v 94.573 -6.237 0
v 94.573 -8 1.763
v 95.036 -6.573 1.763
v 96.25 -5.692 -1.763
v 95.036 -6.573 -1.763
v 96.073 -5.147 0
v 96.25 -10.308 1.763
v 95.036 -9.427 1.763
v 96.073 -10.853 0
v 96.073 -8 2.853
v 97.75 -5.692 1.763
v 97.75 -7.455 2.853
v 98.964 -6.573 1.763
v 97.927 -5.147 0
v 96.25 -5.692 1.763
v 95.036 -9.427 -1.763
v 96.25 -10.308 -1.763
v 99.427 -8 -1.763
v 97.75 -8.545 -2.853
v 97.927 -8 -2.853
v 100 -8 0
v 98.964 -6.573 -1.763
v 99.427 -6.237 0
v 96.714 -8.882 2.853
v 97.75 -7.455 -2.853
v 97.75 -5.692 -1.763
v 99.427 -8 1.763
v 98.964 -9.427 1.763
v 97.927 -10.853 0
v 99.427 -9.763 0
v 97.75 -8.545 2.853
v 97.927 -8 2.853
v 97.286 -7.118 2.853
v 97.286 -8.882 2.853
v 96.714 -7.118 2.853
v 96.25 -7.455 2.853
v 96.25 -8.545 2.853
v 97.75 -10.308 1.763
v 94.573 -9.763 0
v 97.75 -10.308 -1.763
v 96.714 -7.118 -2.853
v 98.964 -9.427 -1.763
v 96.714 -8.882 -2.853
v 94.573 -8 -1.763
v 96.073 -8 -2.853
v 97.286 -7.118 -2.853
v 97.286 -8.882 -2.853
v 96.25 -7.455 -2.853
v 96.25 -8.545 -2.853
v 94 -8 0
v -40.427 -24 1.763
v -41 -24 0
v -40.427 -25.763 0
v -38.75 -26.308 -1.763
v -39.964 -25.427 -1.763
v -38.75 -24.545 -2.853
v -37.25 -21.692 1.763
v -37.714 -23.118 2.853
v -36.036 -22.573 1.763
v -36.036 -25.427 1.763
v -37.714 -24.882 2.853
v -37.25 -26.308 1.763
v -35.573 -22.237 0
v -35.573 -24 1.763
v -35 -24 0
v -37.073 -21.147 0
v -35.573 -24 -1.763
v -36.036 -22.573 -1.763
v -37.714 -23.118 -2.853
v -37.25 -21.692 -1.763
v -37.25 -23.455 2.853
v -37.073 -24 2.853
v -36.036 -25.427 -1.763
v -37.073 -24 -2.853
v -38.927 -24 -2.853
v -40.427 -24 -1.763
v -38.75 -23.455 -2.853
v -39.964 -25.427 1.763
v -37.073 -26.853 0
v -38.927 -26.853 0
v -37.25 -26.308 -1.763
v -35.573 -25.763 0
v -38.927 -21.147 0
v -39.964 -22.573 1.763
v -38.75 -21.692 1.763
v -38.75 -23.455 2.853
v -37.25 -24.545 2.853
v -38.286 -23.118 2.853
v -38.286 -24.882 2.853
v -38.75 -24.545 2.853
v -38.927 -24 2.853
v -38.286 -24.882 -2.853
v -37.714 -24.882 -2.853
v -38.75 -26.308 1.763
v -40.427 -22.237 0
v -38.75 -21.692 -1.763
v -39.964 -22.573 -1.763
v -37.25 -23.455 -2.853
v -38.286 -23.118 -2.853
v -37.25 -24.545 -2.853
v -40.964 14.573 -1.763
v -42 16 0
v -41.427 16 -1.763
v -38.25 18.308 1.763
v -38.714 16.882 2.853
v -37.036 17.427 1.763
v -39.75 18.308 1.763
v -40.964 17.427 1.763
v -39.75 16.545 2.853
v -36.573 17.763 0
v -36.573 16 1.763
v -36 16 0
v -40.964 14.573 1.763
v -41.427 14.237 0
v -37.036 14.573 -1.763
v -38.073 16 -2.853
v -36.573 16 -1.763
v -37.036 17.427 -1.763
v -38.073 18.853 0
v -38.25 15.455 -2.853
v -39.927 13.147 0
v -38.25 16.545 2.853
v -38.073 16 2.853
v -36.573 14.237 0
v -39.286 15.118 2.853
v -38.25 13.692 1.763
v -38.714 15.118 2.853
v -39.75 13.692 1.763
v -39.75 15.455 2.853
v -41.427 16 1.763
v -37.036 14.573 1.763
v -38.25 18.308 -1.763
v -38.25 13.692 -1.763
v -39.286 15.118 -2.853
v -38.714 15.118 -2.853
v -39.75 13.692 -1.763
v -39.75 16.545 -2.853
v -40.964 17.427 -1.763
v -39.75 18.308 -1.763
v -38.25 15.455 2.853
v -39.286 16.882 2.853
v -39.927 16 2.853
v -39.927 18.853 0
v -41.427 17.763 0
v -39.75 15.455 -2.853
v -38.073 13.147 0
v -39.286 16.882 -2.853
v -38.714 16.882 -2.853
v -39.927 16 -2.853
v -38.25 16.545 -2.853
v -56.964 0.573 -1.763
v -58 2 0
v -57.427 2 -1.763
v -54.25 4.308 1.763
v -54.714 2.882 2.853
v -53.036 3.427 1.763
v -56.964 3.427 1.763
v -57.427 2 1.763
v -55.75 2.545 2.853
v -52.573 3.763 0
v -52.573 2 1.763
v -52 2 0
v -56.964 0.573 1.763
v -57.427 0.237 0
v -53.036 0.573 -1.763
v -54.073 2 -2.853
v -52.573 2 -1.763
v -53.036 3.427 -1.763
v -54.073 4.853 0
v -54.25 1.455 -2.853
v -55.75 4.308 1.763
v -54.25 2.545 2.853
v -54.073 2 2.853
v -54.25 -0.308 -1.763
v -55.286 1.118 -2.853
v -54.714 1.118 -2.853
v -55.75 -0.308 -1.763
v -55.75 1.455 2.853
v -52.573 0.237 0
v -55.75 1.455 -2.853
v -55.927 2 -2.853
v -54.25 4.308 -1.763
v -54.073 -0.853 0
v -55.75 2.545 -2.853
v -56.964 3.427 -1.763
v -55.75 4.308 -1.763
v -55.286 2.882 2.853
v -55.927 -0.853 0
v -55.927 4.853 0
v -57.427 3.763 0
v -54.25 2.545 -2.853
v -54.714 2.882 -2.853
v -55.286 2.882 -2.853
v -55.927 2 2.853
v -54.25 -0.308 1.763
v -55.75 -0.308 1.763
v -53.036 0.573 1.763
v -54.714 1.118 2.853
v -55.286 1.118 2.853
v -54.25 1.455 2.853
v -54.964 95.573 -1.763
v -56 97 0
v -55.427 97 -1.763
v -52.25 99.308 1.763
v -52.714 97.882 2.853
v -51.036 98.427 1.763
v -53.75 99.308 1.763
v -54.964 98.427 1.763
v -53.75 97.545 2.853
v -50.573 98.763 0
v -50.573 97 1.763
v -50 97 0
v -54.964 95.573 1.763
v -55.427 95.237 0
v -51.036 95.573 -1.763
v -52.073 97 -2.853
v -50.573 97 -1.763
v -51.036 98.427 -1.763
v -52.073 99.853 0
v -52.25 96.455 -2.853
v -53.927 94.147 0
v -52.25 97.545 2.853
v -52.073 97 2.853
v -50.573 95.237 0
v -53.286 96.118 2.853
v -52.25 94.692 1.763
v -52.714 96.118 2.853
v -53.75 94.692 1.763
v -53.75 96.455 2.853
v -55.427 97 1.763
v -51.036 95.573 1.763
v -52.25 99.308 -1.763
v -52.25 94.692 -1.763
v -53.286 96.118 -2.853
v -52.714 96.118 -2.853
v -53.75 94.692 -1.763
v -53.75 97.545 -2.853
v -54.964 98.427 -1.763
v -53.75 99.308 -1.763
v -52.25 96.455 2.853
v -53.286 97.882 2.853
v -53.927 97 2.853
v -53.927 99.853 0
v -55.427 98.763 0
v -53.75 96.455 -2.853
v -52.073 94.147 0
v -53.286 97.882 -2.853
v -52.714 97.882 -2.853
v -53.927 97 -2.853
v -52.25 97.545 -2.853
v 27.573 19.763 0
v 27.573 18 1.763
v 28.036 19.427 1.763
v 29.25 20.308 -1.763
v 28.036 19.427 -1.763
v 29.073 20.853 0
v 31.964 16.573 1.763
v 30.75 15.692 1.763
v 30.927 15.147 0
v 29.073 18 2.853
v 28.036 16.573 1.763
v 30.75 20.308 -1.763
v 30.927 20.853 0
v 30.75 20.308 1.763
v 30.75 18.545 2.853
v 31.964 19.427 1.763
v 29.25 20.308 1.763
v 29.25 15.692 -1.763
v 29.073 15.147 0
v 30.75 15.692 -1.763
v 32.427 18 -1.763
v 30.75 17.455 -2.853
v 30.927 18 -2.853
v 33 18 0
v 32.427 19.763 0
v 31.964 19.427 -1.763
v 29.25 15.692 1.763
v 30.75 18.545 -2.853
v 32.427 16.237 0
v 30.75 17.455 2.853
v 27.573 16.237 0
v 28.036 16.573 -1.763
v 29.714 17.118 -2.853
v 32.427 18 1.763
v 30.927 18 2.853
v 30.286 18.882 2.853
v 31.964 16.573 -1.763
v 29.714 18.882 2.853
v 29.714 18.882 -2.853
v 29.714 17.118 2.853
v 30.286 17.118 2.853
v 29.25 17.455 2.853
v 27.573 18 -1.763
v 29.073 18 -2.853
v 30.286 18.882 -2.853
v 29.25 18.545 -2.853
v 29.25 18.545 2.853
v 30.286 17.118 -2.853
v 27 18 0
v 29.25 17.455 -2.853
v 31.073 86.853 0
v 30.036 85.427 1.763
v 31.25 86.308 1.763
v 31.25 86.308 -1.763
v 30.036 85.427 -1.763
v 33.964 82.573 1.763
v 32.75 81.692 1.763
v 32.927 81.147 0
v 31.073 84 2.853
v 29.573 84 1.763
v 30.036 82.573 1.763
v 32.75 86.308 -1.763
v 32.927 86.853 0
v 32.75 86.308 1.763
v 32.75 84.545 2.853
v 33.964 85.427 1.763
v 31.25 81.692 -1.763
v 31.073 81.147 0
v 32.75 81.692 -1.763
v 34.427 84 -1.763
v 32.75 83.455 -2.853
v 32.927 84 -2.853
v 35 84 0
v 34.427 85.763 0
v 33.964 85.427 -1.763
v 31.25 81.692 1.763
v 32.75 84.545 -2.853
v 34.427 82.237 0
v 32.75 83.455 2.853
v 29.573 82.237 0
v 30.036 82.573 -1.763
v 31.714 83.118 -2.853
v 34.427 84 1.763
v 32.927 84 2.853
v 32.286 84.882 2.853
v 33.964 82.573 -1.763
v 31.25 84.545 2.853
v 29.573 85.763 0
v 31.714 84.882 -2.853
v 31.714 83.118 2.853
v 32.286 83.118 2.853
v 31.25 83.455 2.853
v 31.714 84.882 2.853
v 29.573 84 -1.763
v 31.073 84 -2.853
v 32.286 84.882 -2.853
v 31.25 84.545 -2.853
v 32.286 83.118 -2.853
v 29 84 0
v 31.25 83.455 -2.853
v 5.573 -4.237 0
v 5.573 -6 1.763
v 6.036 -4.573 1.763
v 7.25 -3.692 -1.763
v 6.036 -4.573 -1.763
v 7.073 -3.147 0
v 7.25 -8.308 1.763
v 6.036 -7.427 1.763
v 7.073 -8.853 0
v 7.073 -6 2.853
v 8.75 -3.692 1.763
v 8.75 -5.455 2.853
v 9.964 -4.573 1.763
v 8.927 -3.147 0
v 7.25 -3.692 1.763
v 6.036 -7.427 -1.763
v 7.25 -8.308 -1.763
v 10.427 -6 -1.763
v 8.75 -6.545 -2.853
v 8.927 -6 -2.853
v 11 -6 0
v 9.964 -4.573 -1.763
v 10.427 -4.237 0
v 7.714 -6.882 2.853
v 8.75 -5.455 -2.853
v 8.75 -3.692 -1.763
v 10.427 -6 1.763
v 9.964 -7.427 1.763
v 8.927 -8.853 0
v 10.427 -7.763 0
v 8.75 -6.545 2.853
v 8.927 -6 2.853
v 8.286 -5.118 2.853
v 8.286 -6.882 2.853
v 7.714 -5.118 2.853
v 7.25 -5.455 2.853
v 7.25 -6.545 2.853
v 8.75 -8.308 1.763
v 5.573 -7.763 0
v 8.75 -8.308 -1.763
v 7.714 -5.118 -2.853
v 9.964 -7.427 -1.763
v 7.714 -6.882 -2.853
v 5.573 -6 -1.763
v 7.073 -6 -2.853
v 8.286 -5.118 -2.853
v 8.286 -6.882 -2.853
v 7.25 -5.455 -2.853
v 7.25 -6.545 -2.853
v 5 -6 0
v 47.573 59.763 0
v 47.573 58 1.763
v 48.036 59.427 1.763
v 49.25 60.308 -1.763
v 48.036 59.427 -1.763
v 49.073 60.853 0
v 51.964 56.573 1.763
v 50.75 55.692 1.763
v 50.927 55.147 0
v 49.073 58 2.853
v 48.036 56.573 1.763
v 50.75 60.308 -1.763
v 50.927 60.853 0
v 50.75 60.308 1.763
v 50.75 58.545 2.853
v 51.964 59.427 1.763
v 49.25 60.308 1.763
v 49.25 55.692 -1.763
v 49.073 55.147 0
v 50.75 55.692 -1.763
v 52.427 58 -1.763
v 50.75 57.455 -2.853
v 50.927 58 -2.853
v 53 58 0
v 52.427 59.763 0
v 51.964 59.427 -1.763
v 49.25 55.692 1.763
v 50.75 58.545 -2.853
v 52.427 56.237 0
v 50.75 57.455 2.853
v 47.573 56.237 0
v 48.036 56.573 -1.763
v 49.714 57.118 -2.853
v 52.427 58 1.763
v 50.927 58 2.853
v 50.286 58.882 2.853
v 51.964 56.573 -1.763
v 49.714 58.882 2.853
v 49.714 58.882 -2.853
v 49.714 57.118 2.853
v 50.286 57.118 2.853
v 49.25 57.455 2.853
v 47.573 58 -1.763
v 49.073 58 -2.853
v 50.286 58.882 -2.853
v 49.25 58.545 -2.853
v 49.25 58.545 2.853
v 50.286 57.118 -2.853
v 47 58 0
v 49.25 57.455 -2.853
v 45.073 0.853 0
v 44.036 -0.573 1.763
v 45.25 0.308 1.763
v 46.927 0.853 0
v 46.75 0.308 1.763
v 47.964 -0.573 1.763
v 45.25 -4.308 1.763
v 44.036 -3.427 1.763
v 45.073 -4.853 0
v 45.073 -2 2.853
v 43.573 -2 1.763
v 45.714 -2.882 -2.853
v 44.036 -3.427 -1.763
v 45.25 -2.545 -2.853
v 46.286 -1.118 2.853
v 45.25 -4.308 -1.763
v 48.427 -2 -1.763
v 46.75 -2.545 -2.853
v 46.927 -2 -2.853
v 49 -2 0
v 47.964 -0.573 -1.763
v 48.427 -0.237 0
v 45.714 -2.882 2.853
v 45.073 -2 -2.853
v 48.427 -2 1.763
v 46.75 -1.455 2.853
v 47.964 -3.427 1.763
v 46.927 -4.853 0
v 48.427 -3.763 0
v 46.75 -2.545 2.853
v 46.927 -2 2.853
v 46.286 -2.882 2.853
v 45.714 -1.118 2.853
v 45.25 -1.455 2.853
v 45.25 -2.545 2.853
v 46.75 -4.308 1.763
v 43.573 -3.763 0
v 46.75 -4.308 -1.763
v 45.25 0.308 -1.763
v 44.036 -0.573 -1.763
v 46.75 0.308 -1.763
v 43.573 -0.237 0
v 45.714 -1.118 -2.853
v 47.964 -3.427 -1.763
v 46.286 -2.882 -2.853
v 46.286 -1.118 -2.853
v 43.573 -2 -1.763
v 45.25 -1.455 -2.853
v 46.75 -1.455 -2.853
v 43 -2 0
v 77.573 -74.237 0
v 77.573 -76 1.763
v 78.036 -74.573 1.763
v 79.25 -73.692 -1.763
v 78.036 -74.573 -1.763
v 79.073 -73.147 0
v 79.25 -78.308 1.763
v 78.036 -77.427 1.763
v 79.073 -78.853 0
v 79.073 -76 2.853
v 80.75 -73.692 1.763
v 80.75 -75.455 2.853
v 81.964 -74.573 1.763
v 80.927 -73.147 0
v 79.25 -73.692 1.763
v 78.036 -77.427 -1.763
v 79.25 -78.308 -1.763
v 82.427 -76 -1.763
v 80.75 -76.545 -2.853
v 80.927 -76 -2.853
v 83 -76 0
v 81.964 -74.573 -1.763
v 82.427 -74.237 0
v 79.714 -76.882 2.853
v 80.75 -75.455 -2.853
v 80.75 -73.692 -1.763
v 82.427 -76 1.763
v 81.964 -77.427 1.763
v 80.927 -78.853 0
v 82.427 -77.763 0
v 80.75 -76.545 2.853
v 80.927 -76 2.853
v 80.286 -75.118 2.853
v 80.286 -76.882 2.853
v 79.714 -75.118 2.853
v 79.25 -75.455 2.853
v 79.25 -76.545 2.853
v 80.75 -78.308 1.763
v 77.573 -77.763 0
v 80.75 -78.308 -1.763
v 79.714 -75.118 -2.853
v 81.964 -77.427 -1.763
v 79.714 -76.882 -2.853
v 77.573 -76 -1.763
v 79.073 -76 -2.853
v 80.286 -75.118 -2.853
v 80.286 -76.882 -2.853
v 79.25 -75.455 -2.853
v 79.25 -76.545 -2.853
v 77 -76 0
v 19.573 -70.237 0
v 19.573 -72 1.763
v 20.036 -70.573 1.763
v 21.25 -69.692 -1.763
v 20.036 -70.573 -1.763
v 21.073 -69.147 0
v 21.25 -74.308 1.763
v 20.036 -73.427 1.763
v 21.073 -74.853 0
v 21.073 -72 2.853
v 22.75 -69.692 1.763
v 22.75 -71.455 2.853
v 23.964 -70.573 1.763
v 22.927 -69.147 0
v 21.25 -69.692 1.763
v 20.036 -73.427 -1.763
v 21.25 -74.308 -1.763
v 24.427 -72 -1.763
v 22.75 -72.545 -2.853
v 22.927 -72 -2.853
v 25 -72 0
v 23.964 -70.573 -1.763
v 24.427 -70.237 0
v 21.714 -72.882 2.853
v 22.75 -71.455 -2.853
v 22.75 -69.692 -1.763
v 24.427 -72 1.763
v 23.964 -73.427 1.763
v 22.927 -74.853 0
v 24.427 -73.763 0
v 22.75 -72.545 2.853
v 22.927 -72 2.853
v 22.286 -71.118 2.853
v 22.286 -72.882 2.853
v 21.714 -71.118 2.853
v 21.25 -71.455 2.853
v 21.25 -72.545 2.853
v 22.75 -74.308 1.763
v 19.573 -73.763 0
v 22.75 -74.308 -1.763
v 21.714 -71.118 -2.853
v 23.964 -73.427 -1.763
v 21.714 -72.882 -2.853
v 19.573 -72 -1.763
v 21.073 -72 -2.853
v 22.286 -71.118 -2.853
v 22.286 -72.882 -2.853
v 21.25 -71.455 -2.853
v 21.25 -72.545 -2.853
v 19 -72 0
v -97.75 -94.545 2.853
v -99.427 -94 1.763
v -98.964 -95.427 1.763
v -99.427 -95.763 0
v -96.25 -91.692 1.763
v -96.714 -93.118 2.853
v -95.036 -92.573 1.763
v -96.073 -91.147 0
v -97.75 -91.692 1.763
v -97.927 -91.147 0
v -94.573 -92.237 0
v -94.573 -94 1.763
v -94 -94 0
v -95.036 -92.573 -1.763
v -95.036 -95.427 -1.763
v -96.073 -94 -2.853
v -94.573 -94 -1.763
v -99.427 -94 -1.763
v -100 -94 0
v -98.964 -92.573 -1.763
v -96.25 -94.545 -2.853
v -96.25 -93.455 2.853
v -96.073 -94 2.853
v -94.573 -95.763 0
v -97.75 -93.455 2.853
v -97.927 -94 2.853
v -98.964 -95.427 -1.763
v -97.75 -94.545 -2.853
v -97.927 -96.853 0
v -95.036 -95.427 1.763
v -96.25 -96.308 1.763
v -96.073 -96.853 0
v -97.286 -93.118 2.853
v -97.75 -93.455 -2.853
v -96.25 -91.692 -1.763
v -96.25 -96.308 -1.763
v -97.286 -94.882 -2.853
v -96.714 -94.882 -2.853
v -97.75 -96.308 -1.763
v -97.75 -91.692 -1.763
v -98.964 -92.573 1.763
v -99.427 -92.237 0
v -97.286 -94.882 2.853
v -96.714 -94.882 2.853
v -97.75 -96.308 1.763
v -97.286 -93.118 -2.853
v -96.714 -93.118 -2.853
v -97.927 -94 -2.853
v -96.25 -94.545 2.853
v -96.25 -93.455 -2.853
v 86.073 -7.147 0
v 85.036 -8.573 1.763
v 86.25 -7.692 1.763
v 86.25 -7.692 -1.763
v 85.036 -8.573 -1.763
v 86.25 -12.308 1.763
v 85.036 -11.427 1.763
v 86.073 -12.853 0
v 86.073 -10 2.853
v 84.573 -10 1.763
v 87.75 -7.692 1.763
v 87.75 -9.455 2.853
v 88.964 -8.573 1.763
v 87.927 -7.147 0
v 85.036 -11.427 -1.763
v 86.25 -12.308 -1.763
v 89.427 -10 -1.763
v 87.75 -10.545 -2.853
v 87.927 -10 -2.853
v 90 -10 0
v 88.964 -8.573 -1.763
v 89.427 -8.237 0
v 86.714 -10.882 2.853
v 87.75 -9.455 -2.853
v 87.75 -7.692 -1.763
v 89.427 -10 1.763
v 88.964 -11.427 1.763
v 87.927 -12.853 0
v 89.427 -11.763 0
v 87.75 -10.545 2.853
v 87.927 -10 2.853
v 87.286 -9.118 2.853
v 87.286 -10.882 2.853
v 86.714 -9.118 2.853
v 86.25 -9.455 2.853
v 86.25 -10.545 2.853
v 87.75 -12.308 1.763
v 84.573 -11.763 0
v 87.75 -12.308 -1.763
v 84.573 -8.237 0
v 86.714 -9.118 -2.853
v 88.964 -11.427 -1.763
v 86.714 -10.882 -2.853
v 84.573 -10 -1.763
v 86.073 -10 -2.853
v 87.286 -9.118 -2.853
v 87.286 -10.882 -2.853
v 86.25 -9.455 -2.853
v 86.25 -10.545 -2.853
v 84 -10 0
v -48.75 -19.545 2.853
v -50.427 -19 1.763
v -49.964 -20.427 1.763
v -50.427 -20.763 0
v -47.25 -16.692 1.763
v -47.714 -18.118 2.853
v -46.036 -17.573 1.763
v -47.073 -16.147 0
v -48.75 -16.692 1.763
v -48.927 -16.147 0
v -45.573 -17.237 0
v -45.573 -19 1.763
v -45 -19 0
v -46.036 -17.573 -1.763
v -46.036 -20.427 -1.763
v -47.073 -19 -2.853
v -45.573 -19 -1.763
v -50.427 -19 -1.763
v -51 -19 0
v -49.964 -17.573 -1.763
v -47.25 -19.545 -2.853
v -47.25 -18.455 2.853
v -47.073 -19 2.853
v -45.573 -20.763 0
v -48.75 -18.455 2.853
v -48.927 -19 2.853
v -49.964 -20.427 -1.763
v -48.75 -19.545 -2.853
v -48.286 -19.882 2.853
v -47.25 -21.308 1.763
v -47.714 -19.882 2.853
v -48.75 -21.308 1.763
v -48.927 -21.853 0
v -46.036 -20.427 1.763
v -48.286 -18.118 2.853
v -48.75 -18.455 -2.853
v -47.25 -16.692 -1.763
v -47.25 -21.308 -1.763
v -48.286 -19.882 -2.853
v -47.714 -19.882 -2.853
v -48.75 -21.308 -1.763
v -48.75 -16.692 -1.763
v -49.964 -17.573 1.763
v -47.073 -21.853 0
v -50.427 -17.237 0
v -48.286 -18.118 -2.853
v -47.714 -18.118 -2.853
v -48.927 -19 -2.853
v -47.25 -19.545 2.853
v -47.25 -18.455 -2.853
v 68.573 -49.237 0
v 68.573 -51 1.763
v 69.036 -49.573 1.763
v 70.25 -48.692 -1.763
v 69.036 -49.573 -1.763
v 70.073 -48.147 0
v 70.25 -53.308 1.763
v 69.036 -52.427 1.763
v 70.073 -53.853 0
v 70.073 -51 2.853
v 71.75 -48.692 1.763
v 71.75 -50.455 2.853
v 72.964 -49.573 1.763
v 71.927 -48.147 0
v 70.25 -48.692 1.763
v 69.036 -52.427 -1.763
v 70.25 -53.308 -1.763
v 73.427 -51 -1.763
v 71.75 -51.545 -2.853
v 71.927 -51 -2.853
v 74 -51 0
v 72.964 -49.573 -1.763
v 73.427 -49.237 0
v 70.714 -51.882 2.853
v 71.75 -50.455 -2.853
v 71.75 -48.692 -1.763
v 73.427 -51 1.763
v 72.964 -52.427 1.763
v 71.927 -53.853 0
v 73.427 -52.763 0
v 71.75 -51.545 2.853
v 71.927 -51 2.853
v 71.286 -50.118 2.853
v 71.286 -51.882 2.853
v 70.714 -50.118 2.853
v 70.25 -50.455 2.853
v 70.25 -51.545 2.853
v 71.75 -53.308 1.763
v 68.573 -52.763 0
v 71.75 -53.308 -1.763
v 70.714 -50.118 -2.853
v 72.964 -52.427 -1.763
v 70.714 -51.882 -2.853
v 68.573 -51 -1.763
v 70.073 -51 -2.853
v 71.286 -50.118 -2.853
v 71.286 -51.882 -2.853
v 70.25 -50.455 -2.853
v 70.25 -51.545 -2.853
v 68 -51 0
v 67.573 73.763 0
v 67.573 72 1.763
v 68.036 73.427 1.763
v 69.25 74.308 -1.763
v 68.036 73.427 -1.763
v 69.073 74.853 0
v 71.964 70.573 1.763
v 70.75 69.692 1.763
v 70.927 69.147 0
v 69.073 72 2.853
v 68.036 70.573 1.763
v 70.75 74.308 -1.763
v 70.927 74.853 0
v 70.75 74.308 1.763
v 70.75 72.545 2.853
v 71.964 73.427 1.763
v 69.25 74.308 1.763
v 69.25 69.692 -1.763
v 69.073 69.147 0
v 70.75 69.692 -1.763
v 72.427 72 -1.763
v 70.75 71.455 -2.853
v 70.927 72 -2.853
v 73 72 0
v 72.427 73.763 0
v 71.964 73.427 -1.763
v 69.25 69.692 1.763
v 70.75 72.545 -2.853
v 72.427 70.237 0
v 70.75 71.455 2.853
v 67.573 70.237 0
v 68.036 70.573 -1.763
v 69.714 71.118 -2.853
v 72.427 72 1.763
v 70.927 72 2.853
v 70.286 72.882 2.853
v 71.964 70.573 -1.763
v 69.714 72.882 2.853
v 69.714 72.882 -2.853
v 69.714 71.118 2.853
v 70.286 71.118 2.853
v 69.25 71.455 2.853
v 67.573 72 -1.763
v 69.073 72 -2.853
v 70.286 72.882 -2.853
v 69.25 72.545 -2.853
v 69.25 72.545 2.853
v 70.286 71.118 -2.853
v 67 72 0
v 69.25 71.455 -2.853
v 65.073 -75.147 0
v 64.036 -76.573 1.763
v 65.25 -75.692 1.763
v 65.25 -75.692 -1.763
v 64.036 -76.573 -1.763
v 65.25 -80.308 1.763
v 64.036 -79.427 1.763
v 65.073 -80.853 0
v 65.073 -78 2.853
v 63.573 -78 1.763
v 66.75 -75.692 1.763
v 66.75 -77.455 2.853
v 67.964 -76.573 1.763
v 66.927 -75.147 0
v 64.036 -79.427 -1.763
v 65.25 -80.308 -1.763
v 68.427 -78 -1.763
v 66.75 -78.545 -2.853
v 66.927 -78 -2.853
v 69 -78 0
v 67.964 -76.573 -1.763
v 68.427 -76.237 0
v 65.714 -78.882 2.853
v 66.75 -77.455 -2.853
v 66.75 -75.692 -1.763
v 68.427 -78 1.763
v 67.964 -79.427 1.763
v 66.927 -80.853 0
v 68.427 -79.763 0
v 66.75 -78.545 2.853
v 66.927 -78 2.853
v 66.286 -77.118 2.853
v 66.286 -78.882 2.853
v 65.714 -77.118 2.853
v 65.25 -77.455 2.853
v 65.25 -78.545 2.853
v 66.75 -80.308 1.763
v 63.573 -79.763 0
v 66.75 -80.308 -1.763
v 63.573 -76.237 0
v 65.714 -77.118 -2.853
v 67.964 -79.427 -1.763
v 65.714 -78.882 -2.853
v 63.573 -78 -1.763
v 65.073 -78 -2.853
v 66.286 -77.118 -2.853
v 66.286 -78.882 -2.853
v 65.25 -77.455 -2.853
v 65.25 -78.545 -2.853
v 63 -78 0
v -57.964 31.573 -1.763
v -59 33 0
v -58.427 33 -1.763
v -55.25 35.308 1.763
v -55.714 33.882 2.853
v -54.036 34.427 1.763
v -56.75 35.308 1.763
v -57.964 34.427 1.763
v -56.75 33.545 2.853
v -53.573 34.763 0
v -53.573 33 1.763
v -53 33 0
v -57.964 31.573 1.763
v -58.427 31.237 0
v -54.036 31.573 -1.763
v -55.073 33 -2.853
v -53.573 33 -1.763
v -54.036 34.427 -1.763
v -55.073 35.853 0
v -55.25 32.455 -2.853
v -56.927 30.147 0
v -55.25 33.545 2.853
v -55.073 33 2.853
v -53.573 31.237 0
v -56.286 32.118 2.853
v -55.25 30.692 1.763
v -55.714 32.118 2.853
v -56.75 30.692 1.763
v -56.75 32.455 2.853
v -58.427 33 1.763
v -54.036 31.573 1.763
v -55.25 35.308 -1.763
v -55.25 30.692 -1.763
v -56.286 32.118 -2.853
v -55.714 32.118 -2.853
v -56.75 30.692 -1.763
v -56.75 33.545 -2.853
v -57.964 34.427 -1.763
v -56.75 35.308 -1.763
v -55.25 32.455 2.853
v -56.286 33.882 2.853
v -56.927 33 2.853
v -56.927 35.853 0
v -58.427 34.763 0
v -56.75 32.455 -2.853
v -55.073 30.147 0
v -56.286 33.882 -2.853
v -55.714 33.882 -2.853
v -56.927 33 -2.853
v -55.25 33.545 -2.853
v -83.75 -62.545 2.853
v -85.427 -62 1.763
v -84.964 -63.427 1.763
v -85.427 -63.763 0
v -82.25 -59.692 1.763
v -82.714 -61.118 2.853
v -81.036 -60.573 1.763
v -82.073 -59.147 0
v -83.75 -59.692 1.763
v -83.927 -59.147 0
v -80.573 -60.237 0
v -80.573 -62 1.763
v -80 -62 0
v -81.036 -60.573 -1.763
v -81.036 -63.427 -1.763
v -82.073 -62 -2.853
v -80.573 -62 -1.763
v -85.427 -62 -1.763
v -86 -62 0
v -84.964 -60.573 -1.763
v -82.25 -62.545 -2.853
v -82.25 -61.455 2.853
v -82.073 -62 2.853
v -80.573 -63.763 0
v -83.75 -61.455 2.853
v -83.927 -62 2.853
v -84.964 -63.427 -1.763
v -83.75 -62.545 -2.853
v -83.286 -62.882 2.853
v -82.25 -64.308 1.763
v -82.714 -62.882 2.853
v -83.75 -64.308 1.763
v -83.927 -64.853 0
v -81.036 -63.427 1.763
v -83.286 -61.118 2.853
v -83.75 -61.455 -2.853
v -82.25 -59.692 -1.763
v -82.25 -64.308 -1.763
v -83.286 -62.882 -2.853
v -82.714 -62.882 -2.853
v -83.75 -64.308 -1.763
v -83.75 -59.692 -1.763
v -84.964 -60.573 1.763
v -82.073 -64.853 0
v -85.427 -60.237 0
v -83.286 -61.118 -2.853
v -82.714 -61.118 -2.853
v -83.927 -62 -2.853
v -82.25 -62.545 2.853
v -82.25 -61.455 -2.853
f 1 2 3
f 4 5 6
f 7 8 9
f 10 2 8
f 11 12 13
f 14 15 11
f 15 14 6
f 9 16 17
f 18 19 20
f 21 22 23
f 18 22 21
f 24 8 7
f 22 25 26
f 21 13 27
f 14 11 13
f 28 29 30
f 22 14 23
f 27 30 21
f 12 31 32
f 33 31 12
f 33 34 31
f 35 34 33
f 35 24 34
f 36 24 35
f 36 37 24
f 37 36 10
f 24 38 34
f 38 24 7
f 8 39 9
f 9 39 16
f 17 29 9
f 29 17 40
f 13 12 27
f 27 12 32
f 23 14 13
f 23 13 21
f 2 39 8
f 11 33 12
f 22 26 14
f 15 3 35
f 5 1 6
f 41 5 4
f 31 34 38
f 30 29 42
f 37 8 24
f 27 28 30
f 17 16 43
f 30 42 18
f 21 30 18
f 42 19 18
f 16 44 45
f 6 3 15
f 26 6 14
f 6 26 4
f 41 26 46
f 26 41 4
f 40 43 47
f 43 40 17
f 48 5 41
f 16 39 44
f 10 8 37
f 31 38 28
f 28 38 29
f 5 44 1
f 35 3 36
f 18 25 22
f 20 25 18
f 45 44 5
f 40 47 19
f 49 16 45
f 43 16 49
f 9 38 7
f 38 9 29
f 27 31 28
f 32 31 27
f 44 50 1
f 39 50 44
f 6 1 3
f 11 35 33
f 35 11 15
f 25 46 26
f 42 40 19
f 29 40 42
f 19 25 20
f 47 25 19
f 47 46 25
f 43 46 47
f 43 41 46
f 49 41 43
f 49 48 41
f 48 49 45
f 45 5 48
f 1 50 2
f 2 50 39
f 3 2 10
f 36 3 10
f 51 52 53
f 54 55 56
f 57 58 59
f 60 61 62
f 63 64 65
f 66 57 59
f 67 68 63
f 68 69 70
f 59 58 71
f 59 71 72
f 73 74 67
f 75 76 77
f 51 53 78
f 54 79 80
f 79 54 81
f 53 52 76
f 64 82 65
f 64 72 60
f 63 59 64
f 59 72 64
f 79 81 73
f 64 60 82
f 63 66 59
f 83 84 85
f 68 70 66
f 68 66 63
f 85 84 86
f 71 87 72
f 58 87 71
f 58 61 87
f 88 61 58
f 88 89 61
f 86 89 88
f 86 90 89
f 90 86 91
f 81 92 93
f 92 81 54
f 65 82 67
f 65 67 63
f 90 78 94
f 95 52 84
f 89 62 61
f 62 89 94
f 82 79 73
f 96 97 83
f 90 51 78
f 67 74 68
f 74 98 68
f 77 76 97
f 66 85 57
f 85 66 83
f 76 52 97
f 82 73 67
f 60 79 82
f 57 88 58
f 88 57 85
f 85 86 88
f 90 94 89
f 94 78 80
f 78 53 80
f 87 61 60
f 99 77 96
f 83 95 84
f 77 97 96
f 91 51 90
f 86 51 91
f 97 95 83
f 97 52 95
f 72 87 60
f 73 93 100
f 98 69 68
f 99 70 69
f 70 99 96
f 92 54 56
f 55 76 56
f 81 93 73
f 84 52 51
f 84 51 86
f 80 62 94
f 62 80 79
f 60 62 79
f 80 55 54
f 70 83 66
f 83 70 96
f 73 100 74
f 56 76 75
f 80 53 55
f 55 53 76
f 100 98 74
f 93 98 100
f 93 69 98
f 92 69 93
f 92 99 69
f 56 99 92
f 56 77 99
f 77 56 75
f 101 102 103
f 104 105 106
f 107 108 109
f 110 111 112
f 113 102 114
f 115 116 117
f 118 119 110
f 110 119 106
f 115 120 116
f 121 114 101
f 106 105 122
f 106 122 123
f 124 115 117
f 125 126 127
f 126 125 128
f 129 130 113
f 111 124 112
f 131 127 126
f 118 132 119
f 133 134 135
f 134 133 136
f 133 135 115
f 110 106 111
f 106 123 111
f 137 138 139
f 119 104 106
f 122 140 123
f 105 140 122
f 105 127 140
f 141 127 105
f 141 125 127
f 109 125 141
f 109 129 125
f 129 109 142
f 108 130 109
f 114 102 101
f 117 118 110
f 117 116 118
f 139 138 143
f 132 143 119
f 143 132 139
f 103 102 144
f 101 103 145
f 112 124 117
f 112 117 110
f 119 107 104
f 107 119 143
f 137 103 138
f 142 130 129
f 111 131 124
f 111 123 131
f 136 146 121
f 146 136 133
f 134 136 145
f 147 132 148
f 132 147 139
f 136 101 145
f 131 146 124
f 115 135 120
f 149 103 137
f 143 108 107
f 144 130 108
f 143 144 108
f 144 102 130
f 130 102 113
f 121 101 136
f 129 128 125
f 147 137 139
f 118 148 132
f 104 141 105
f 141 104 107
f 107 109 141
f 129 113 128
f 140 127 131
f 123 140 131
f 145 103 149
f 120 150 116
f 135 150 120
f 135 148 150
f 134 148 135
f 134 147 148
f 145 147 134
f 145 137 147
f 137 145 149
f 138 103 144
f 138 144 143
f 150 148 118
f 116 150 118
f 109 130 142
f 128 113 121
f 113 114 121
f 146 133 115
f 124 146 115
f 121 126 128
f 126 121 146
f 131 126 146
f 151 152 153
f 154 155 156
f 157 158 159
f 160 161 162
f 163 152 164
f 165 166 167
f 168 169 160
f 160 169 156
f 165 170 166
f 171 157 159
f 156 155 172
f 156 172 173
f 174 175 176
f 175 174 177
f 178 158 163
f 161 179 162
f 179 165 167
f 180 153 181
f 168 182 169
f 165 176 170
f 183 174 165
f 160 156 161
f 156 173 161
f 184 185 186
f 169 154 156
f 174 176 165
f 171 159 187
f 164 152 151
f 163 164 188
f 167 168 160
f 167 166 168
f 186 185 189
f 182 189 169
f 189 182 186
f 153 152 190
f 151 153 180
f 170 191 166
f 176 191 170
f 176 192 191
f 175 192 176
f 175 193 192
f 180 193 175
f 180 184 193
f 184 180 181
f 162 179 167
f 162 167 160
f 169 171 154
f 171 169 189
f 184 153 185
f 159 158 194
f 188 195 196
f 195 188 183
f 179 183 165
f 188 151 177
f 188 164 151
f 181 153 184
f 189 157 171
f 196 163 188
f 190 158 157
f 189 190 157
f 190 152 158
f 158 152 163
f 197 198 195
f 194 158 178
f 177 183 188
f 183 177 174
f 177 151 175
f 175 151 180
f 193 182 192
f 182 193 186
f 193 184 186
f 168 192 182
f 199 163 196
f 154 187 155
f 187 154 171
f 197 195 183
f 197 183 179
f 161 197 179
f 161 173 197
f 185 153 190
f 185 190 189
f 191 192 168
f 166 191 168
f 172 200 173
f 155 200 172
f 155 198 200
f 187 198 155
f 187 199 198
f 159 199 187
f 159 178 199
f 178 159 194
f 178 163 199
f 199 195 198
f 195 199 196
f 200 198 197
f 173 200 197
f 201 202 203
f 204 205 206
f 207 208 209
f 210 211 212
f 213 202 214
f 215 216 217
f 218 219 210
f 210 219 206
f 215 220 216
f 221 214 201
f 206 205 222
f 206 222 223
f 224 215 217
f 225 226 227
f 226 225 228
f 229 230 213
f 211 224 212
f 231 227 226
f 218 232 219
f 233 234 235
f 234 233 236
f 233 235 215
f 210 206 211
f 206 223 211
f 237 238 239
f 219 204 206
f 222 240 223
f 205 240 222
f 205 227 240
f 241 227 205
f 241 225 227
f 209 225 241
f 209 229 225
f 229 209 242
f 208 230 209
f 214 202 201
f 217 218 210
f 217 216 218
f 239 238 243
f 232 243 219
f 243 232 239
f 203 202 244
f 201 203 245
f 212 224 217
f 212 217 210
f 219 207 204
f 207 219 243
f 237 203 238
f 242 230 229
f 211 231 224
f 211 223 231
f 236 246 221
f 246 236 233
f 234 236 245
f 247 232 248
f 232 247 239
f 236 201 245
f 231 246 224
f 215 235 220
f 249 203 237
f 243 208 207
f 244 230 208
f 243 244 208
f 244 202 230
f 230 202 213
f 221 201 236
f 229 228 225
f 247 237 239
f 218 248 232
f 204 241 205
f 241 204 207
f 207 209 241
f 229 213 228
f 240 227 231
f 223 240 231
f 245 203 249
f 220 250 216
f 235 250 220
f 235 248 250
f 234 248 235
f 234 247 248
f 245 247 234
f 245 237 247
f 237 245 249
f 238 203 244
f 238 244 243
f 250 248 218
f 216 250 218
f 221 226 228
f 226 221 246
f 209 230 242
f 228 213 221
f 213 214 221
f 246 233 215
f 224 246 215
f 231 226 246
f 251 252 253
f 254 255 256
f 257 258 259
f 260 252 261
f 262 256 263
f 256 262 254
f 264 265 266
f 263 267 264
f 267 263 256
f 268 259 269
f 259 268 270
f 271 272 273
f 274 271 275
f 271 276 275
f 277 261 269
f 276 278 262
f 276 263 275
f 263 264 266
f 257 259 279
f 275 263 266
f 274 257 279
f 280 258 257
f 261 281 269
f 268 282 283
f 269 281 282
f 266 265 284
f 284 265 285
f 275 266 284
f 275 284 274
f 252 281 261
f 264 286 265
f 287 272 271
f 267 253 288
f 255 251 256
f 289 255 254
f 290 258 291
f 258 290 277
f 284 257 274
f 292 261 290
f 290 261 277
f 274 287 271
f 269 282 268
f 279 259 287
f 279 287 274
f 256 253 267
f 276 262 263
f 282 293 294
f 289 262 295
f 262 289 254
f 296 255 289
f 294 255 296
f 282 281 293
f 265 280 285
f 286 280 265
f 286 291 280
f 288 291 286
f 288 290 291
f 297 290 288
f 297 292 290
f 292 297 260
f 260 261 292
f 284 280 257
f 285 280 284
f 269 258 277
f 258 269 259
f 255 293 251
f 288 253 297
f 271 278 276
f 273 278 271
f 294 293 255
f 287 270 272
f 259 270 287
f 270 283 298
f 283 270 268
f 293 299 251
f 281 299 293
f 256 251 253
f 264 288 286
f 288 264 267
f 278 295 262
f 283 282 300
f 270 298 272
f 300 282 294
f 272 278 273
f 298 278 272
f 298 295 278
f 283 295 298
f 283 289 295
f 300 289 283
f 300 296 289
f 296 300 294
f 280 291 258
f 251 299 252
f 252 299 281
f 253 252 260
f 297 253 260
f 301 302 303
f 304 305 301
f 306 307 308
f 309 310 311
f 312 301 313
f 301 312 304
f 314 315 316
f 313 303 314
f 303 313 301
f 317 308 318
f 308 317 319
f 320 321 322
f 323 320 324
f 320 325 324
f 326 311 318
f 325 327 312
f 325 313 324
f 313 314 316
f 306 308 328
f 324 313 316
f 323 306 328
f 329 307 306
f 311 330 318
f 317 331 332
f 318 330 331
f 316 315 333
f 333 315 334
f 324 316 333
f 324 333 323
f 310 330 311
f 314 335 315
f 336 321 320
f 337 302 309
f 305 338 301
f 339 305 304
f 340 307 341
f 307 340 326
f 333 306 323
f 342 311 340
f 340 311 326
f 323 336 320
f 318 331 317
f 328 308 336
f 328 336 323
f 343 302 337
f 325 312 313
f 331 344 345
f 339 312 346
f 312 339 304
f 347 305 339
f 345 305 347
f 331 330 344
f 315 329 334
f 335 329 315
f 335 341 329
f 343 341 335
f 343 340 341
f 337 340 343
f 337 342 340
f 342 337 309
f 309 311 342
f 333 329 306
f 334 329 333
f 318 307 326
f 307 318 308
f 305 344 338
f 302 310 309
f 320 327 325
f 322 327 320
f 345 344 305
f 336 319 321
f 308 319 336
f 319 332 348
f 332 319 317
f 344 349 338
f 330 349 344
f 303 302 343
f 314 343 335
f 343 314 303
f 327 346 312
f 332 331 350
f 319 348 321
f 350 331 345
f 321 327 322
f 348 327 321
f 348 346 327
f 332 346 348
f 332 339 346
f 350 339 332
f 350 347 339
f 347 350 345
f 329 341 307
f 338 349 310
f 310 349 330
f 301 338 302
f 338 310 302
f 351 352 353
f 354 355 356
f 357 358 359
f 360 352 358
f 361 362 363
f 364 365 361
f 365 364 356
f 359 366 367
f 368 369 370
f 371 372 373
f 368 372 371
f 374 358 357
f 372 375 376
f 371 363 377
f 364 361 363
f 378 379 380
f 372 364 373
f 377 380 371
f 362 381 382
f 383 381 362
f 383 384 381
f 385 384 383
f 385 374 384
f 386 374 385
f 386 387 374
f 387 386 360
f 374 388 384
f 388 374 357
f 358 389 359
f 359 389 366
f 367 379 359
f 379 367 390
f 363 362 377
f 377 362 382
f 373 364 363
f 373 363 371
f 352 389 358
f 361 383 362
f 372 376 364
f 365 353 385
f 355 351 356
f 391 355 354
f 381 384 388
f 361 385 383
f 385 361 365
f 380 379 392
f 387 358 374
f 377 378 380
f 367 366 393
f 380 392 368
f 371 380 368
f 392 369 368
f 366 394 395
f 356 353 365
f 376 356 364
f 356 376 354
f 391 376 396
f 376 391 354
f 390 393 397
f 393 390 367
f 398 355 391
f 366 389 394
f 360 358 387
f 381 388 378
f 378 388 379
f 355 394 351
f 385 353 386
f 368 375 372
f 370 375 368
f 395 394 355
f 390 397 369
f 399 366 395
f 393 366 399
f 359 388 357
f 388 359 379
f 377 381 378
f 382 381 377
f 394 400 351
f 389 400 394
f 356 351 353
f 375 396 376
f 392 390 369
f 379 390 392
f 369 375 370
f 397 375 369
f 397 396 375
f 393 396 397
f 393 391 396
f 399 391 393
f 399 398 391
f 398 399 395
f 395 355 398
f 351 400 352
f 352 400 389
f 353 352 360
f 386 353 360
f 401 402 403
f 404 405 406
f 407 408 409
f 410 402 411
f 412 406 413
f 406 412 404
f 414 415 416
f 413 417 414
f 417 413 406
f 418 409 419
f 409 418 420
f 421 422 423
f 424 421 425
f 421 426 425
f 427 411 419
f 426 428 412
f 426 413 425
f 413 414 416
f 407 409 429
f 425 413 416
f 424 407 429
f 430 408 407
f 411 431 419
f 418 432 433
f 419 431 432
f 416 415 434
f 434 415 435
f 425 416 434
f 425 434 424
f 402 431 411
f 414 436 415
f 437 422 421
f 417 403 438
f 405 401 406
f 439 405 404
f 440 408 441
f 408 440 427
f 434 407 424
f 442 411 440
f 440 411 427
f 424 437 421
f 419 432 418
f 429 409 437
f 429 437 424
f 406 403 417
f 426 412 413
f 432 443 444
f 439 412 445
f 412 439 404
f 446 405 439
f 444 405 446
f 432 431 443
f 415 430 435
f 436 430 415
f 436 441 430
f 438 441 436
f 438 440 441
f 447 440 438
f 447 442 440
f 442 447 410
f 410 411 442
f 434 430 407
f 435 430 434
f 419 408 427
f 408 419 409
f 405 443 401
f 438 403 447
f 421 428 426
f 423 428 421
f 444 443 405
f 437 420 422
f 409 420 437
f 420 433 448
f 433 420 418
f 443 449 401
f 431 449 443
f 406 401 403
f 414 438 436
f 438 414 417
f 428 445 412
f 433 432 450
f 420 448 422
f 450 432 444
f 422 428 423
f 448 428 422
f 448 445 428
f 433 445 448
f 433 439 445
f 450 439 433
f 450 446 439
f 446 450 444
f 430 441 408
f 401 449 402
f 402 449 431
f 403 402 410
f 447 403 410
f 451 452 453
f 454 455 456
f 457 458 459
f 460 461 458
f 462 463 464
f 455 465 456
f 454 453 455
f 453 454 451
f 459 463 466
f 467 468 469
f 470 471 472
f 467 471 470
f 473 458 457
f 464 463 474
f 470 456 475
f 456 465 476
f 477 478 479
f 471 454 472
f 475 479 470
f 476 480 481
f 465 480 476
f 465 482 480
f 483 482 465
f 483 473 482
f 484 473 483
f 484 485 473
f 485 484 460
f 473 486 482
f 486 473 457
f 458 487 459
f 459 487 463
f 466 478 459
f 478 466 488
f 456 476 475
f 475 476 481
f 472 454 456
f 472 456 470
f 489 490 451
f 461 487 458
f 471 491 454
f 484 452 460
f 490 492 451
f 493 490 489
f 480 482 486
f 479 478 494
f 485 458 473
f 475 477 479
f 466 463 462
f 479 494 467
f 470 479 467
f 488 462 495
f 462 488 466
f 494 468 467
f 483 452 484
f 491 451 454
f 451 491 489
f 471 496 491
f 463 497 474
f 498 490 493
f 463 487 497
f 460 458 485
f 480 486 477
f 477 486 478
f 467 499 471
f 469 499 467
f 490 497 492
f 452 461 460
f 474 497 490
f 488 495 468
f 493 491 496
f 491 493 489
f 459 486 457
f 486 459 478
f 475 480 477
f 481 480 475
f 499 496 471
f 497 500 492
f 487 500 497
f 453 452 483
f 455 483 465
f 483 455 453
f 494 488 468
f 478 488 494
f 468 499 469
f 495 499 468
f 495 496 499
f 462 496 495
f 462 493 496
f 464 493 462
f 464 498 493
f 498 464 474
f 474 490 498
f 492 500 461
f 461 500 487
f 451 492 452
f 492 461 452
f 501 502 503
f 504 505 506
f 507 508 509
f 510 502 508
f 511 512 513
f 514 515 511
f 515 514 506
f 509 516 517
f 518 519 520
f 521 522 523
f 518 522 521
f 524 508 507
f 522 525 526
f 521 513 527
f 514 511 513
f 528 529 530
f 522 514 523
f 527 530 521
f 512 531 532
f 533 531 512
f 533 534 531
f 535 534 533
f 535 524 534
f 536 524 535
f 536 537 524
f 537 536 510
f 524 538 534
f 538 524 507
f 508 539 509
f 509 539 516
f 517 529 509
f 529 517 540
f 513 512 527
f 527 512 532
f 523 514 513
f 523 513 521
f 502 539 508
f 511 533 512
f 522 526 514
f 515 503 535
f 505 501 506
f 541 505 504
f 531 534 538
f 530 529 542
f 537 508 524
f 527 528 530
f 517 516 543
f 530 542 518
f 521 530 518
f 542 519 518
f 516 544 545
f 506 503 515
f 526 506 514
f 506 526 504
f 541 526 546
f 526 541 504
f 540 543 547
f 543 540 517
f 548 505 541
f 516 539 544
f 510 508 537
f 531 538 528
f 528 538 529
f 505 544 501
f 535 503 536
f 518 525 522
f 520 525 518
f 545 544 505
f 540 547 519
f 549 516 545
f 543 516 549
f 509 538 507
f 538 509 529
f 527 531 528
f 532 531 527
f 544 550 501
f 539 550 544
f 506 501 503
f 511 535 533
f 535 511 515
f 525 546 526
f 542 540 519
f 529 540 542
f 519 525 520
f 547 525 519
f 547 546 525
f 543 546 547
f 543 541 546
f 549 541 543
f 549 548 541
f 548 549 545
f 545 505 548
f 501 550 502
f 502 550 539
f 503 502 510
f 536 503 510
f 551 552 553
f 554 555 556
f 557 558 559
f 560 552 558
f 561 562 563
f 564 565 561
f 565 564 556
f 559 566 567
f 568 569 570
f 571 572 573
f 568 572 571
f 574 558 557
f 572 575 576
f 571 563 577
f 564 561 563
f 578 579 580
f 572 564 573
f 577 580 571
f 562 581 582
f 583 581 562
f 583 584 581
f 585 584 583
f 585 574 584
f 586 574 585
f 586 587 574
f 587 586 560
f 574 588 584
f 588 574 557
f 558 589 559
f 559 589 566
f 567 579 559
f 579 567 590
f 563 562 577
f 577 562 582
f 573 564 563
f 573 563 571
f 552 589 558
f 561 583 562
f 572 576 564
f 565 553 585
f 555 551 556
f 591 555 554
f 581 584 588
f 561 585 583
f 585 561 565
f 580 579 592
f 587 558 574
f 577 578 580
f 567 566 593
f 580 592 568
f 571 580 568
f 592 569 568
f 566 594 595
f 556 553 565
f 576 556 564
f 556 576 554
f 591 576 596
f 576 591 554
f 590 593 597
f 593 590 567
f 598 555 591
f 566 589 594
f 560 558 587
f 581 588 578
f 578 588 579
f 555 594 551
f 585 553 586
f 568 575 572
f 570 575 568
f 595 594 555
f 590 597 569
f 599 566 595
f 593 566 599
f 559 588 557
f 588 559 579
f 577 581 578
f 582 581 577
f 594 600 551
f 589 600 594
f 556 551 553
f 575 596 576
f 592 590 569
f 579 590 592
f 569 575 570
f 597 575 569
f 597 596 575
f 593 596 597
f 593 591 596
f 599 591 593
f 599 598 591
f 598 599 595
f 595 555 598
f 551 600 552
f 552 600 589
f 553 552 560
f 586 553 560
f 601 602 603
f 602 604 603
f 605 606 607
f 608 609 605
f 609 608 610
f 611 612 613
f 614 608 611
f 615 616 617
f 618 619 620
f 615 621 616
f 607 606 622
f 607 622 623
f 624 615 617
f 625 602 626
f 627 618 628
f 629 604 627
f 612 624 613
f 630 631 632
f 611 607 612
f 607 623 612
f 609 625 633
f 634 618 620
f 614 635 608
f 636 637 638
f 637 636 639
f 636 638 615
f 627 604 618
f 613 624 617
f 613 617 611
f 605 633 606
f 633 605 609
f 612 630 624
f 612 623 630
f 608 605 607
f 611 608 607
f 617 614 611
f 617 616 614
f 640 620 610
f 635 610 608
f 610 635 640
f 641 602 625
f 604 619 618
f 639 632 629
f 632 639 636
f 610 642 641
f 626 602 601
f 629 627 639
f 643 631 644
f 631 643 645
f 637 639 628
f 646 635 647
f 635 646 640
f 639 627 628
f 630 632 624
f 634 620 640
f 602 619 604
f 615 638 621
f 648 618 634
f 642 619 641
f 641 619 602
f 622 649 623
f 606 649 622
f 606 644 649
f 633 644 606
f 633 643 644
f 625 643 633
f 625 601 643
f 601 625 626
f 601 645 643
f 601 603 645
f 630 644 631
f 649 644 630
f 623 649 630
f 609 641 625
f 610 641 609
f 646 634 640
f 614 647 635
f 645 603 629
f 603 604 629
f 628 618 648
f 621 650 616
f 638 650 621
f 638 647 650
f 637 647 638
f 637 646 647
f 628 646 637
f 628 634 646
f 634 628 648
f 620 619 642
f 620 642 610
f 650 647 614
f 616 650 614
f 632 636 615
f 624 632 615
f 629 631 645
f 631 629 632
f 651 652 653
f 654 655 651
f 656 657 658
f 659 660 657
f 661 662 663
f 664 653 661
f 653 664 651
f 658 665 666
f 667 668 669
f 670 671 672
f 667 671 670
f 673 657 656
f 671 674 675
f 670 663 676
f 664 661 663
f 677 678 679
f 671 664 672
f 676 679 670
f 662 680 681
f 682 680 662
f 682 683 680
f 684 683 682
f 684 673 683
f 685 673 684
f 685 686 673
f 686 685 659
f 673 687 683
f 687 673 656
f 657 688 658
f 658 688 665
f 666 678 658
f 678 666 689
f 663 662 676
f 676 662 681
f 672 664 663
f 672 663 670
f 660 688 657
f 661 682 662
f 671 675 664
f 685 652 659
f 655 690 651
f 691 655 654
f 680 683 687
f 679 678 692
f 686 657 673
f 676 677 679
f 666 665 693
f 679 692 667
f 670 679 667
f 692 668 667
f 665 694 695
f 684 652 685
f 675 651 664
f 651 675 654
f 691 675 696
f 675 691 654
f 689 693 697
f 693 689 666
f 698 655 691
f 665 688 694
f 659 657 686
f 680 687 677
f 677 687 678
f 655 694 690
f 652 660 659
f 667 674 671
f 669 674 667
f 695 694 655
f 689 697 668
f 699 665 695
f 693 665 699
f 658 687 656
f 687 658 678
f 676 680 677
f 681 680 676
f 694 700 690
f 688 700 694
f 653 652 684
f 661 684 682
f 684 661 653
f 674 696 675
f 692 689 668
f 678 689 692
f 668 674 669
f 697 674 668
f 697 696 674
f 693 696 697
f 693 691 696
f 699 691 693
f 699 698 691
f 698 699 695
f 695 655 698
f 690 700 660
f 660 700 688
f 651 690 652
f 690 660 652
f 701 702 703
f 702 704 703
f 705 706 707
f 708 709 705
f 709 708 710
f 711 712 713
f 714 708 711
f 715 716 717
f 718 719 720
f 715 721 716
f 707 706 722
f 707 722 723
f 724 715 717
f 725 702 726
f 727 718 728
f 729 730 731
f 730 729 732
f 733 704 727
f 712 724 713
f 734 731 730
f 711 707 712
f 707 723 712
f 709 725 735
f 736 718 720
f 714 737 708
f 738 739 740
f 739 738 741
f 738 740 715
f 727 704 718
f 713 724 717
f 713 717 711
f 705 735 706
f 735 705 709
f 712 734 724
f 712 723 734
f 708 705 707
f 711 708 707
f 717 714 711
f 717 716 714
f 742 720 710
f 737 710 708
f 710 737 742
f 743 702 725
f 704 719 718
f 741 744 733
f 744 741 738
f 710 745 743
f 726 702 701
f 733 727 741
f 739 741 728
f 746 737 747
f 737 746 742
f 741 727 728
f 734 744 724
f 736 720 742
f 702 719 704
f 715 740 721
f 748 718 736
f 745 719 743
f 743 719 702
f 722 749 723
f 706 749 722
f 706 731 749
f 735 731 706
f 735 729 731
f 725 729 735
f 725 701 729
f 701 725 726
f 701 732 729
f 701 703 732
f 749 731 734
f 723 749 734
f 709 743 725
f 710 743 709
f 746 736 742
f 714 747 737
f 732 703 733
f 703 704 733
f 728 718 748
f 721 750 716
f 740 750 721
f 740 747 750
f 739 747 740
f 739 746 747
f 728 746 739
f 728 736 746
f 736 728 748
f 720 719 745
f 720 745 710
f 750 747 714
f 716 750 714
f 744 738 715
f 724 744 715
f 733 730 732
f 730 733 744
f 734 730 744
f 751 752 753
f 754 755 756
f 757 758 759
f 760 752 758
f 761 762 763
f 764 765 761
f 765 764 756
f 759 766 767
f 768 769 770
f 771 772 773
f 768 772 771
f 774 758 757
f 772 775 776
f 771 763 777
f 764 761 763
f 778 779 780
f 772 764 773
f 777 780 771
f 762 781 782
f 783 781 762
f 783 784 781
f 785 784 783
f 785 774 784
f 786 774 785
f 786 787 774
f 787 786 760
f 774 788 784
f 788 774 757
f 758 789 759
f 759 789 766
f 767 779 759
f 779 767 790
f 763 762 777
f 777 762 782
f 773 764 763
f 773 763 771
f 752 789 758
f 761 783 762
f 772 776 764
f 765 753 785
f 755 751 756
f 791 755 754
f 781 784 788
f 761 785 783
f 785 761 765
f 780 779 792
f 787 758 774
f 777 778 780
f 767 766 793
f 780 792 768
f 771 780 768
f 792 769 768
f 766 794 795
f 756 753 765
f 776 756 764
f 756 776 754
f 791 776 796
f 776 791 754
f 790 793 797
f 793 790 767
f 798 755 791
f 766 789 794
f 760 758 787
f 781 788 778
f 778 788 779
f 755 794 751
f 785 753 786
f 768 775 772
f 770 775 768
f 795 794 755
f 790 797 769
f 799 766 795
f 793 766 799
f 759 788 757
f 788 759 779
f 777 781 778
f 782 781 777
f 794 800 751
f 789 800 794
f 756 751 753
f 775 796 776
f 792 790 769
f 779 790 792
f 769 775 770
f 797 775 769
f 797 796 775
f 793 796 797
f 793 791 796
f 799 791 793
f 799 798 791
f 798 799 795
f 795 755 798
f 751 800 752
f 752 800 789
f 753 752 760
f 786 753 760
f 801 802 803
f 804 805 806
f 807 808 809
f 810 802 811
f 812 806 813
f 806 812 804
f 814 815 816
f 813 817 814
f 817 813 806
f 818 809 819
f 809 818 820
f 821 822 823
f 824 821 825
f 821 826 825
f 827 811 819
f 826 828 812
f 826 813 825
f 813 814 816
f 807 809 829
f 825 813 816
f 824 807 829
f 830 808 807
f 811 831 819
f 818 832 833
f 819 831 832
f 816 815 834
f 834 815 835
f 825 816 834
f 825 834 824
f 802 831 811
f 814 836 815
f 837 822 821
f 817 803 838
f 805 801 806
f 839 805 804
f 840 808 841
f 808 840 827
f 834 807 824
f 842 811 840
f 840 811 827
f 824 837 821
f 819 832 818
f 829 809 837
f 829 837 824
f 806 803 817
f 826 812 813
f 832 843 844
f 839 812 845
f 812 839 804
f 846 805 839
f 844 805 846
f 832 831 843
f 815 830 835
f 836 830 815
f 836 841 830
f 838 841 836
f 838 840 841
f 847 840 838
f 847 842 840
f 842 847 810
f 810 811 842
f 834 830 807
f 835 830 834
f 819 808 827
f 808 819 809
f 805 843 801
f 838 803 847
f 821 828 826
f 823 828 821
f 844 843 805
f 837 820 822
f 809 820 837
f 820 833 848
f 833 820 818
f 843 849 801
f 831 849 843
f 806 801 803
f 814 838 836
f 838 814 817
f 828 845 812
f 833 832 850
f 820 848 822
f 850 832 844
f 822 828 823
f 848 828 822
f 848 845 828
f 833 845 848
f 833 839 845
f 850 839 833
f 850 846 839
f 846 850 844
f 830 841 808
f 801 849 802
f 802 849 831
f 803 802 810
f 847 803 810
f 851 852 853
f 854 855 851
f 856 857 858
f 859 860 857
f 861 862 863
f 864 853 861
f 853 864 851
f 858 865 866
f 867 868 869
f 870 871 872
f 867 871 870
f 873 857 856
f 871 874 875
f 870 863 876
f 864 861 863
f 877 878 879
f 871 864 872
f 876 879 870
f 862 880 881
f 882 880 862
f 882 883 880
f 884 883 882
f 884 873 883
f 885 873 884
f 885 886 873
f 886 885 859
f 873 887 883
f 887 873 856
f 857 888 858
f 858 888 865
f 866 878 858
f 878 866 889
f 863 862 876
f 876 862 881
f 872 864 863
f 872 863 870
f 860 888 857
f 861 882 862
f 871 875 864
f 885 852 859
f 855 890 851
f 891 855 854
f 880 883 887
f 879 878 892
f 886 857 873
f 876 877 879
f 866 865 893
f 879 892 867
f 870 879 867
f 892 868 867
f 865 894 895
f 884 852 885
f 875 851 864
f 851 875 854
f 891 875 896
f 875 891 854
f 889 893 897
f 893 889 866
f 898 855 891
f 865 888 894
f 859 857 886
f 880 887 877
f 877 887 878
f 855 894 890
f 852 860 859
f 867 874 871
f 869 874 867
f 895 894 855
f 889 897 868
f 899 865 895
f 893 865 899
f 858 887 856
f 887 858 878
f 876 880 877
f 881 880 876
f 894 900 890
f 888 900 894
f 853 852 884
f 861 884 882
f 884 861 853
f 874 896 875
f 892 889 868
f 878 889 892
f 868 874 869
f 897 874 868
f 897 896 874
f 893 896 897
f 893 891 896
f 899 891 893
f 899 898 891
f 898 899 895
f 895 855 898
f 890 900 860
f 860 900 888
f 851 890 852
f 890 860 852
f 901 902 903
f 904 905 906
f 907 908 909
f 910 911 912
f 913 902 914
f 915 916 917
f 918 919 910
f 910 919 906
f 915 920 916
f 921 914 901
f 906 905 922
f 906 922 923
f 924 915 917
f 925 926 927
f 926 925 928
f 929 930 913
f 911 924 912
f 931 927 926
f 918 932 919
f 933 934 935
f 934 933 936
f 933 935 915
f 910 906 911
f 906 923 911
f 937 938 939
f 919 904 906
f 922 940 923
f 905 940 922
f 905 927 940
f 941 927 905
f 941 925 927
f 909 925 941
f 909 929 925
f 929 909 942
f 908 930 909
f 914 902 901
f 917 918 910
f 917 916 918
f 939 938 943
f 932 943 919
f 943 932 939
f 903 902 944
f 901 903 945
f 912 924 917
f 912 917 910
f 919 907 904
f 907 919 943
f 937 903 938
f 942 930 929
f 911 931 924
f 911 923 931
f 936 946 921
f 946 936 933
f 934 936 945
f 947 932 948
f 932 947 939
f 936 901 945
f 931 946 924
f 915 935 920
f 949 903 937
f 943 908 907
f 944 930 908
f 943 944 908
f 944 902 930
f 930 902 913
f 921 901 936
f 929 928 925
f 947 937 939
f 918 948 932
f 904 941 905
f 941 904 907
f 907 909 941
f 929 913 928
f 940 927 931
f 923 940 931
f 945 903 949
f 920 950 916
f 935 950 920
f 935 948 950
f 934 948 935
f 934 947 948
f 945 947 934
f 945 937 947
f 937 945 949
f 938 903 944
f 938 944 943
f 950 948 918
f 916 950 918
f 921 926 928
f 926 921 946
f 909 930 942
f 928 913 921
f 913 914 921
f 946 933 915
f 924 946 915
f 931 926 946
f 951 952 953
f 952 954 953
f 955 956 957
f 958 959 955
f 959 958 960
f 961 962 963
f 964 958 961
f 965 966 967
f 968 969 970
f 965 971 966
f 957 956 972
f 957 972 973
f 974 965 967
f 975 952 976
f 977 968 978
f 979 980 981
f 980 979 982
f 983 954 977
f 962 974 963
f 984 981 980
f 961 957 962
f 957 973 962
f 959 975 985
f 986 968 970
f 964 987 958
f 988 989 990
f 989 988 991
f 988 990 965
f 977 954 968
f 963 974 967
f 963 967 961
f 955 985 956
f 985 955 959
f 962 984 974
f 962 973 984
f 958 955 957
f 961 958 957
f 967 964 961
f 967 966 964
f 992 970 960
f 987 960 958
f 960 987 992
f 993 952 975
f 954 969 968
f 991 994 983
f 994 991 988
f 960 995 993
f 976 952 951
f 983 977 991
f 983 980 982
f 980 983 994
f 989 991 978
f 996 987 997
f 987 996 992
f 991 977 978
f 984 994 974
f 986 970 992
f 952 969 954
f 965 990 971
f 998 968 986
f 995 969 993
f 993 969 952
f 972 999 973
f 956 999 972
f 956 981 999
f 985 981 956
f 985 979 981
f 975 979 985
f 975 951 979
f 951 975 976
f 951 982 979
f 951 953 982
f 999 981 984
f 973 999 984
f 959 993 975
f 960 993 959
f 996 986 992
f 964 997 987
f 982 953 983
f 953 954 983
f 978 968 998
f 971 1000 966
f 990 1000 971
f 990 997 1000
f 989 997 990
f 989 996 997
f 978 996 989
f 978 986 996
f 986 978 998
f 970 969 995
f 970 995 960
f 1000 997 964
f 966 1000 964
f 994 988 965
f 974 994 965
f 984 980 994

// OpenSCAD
//Graham's Scan

// Convex Hull

//random points---------------------------------
function rnd_v(init_value,end_value)=round(rands(init_value,end_value,1)[0]);

init_value=-100;
end_value=100;
points_num=20;
points=[
for(i=[0:points_num-1]
    )
    [rnd_v(init_value,end_value),
     rnd_v(init_value,end_value)
    ]];

for(i=points)
    translate(i)
        sphere(3);

//----------------------------------------------
//quick_sort------------------------------------

function quick_sort(points)=
     let(leng=len(points)-1)
     leng<1? points:
     let(pivot=points[0])
     let(before=[for(i=[1:leng])
                 if(compare(points[i],pivot))
                     points[i]
                 ])
     let(after=[for(i=[1:leng])
                if(compare(points[i],pivot)==false)
                    points[i]
                ])  
      [each quick_sort(before),pivot,each quick_sort(after)];
                              
function hypo_sort(start_p,points)=
      let(leng=len(points)-1)
      leng<1? points:
      let(pivot=points[0])
      let(before=[for(i=[1:leng])
          if(compare(points[i]-start_p,pivot-start_p))
                 points[i]   
          ])
      let(after=[for(i=[1:leng])
          if(compare(points[i]-start_p,pivot-start_p)==false)
                 points[i]
          ])
    [each hypo_sort(start_p,before),pivot,each hypo_sort(start_p,after)];          
               
          
function angular_sort(points)=
          let(array=quick_sort(points))               
          let(start_p=array[0])
          let(new_array=[for(i=[1:len(array)-1])array[i]])
          [start_p,each angular_sort_inner(start_p,new_array)];      
                
          
function angular_sort_inner(start_p,array)=          
          let(leng=len(array)-1)
          leng<1? array:      
                
          let(next_p=array[0])
      
          let(before=[for(i=[1:leng])
                      if(cross_(start_p,next_p,array[i])<0)
                           array[i]
                     ]) 
          let(pivot=[for(i=[1:leng]) 
                     if(cross_(start_p,next_p,array[i])==0)
                           array[i],next_p
                     ])
          let(after=[for(i=[1:leng])
                     if(cross_(start_p,next_p,array[i])>0)
                          array[i]
                    ])   
         [each angular_sort_inner(start_p,before),each hypo_sort(start_p,pivot),each angular_sort_inner(start_p,after)];                               
                     
                                  
//兩點距離的平方
function hypo2(p1,p2)=
     pow(p1.x-p2.x,2)+pow(p1.y-p2.y,2);  
                //---------------------------------------------------

//lower。find the lowest/leftmost point.
function compare(pa,pb)=
         pa.y<pb.y || (pa.y==pb.y && pa.x<pb.x)? true: false;
                
function hypo(x,y)=
     pow(pow(x,2)+pow(y,2),0.5);

//兩點距離的平方
function hypo2(p1,p2)=
     pow(p1.x-p2.x,2)+pow(p1.y-p2.y,2);

//向量OA叉積向量OB。大於零表示OA到OB為逆時針旋轉。
function cross_(po,pa,pb)=
     (pa.x-po.x)*(pb.y-po.y)-(pa.y-po.y)*(pb.x-po.x);

function append(array,num)=[
     for(i=array)
     i,num];

function pop(array)=
     let(init=0)
     let(leng=len(array)-1)
     leng==0?[]:
     [for(i=[init:leng-1])
          array[i]];


function graham_scan(points)=
     let(array=angular_sort(points))
     let(leng=len(array)-1)   
     let(stack=[array[0],array[1],array[2]])
     let(index=len(stack))
     graham_scan_inner(leng,index,stack,array);
     
     
function graham_scan_inner(leng,index,stack,array)=
     index>leng? stack:
     let(stack_leng=len(stack)-1)
     let(start_p=stack[stack_leng-1])
     let(pivot_p=stack[stack_leng])
     let(test_p=array[index])
     
     cross_(start_p,pivot_p,test_p)>0?
     let(stack_=append(stack,test_p))
     graham_scan_inner(leng,index+1,stack_,array):
     
     let(stack_=pop(stack))
     graham_scan_inner(leng,index,stack_,array);
     
echo(graham_scan(points));
 
for(i=graham_scan(points))
    translate(i)
       color("red")
          sphere(3);
     
     
     
     
     

     
